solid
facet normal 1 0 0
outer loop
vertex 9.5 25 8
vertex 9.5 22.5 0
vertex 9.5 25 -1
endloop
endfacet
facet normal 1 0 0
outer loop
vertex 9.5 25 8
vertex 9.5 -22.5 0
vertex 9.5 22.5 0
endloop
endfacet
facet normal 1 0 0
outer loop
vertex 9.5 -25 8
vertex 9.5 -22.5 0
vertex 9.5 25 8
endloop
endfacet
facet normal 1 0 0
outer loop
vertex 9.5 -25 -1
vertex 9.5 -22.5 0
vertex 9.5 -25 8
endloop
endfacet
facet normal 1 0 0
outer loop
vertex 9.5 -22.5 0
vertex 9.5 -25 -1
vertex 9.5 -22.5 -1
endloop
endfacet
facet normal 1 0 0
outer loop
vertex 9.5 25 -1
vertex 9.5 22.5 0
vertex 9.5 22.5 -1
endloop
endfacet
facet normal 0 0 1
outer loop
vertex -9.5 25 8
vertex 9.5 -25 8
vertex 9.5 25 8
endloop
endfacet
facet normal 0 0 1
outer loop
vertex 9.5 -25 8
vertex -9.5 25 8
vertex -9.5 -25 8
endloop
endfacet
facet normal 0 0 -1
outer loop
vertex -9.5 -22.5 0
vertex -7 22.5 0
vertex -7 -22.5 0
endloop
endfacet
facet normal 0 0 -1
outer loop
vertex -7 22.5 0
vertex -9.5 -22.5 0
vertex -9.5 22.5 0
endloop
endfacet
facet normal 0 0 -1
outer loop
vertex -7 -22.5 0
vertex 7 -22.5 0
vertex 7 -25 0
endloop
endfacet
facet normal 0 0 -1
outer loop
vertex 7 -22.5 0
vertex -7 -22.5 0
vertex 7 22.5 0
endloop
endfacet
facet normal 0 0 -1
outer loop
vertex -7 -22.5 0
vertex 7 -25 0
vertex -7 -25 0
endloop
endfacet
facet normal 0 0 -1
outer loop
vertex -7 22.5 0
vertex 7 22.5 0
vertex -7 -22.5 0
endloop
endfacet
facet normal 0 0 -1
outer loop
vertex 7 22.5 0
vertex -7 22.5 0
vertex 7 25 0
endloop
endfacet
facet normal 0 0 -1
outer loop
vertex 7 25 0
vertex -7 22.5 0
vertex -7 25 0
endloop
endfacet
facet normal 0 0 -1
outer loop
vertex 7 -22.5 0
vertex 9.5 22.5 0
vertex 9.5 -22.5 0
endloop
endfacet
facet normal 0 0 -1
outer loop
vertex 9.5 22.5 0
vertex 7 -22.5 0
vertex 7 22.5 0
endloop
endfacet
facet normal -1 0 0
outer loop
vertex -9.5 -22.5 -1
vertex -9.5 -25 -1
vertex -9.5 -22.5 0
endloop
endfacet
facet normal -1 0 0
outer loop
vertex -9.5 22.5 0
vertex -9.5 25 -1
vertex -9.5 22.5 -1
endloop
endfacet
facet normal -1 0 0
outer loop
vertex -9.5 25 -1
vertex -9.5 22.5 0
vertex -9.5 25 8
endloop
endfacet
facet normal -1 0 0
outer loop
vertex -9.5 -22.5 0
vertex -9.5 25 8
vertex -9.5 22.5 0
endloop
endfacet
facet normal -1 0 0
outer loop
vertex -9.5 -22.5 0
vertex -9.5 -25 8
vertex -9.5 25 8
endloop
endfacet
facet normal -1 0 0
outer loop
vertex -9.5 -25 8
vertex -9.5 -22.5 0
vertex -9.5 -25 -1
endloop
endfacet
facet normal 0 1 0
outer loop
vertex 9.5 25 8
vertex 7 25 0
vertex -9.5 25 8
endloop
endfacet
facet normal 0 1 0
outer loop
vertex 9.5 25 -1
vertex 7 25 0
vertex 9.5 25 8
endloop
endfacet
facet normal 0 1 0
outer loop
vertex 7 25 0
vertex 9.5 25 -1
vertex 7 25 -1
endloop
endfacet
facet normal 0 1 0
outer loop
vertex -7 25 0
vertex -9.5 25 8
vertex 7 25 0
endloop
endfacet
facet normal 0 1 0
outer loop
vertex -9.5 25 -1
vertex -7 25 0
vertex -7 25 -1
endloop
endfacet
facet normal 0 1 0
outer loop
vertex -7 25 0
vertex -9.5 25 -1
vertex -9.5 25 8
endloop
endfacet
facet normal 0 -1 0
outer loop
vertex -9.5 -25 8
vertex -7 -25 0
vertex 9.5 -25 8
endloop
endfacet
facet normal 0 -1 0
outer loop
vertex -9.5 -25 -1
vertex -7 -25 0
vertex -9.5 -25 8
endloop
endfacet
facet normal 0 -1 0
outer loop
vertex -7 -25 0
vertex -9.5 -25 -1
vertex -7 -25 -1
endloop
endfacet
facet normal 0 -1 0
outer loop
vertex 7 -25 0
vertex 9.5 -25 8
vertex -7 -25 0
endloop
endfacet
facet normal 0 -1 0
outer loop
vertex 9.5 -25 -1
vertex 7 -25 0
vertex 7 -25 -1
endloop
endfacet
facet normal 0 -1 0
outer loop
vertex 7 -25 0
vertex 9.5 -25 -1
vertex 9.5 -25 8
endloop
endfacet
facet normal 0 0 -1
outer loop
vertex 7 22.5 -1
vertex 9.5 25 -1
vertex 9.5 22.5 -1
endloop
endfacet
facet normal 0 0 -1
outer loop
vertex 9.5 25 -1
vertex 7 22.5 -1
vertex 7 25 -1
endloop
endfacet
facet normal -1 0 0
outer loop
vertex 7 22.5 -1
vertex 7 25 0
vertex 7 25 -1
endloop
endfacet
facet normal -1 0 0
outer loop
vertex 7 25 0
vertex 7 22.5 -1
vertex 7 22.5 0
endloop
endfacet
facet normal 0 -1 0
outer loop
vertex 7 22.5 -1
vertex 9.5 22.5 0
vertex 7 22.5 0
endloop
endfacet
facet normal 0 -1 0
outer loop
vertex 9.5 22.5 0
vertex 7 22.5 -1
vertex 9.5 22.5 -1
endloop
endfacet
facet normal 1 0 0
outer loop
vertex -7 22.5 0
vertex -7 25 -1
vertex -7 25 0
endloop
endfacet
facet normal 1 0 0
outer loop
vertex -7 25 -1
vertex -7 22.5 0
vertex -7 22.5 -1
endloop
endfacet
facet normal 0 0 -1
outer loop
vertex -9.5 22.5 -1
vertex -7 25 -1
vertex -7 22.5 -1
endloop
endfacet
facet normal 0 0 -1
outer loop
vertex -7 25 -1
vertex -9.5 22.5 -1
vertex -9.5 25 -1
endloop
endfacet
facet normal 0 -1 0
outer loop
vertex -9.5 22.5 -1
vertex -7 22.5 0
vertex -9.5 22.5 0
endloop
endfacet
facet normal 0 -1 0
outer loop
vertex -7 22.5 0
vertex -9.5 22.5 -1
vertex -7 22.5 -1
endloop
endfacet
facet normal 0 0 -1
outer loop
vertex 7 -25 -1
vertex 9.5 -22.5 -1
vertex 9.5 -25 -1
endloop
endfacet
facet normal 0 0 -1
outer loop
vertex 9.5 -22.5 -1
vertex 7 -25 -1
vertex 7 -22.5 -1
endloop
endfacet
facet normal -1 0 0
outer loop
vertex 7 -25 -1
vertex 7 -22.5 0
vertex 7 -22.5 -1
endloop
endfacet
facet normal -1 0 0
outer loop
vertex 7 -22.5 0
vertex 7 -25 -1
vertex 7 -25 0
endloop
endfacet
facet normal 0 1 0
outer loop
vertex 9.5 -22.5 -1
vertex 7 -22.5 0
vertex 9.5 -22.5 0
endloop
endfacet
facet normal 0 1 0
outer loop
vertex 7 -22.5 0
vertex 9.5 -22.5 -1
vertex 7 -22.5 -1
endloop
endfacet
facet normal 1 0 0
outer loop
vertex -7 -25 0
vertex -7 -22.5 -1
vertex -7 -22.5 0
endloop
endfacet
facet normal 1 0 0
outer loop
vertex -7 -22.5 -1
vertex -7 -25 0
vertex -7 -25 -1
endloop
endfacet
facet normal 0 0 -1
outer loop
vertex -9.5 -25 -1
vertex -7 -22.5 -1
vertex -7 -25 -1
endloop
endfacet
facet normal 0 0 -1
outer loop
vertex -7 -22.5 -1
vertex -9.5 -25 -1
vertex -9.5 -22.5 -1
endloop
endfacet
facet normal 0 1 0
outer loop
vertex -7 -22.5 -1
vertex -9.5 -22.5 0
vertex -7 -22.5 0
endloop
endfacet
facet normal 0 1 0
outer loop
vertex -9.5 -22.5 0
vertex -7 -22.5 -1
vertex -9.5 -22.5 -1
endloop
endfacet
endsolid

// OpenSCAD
OVERLAP = 3;
translate([-9.5,-25,0]){
cube([19,50,8]);
}
translate([9.5-2.5,25-2.5,-1]){
    cube([2.5,2.5,1+OVERLAP]);
}
translate([-9.5,25-2.5,-1]){
    cube([2.5,2.5,1+OVERLAP]);
}
translate([9.5-2.5,-25,-1]){
    cube([2.5,2.5,1+OVERLAP]);
}
translate([-9.5,-25,-1]){
    cube([2.5,2.5,1+OVERLAP]);
}
